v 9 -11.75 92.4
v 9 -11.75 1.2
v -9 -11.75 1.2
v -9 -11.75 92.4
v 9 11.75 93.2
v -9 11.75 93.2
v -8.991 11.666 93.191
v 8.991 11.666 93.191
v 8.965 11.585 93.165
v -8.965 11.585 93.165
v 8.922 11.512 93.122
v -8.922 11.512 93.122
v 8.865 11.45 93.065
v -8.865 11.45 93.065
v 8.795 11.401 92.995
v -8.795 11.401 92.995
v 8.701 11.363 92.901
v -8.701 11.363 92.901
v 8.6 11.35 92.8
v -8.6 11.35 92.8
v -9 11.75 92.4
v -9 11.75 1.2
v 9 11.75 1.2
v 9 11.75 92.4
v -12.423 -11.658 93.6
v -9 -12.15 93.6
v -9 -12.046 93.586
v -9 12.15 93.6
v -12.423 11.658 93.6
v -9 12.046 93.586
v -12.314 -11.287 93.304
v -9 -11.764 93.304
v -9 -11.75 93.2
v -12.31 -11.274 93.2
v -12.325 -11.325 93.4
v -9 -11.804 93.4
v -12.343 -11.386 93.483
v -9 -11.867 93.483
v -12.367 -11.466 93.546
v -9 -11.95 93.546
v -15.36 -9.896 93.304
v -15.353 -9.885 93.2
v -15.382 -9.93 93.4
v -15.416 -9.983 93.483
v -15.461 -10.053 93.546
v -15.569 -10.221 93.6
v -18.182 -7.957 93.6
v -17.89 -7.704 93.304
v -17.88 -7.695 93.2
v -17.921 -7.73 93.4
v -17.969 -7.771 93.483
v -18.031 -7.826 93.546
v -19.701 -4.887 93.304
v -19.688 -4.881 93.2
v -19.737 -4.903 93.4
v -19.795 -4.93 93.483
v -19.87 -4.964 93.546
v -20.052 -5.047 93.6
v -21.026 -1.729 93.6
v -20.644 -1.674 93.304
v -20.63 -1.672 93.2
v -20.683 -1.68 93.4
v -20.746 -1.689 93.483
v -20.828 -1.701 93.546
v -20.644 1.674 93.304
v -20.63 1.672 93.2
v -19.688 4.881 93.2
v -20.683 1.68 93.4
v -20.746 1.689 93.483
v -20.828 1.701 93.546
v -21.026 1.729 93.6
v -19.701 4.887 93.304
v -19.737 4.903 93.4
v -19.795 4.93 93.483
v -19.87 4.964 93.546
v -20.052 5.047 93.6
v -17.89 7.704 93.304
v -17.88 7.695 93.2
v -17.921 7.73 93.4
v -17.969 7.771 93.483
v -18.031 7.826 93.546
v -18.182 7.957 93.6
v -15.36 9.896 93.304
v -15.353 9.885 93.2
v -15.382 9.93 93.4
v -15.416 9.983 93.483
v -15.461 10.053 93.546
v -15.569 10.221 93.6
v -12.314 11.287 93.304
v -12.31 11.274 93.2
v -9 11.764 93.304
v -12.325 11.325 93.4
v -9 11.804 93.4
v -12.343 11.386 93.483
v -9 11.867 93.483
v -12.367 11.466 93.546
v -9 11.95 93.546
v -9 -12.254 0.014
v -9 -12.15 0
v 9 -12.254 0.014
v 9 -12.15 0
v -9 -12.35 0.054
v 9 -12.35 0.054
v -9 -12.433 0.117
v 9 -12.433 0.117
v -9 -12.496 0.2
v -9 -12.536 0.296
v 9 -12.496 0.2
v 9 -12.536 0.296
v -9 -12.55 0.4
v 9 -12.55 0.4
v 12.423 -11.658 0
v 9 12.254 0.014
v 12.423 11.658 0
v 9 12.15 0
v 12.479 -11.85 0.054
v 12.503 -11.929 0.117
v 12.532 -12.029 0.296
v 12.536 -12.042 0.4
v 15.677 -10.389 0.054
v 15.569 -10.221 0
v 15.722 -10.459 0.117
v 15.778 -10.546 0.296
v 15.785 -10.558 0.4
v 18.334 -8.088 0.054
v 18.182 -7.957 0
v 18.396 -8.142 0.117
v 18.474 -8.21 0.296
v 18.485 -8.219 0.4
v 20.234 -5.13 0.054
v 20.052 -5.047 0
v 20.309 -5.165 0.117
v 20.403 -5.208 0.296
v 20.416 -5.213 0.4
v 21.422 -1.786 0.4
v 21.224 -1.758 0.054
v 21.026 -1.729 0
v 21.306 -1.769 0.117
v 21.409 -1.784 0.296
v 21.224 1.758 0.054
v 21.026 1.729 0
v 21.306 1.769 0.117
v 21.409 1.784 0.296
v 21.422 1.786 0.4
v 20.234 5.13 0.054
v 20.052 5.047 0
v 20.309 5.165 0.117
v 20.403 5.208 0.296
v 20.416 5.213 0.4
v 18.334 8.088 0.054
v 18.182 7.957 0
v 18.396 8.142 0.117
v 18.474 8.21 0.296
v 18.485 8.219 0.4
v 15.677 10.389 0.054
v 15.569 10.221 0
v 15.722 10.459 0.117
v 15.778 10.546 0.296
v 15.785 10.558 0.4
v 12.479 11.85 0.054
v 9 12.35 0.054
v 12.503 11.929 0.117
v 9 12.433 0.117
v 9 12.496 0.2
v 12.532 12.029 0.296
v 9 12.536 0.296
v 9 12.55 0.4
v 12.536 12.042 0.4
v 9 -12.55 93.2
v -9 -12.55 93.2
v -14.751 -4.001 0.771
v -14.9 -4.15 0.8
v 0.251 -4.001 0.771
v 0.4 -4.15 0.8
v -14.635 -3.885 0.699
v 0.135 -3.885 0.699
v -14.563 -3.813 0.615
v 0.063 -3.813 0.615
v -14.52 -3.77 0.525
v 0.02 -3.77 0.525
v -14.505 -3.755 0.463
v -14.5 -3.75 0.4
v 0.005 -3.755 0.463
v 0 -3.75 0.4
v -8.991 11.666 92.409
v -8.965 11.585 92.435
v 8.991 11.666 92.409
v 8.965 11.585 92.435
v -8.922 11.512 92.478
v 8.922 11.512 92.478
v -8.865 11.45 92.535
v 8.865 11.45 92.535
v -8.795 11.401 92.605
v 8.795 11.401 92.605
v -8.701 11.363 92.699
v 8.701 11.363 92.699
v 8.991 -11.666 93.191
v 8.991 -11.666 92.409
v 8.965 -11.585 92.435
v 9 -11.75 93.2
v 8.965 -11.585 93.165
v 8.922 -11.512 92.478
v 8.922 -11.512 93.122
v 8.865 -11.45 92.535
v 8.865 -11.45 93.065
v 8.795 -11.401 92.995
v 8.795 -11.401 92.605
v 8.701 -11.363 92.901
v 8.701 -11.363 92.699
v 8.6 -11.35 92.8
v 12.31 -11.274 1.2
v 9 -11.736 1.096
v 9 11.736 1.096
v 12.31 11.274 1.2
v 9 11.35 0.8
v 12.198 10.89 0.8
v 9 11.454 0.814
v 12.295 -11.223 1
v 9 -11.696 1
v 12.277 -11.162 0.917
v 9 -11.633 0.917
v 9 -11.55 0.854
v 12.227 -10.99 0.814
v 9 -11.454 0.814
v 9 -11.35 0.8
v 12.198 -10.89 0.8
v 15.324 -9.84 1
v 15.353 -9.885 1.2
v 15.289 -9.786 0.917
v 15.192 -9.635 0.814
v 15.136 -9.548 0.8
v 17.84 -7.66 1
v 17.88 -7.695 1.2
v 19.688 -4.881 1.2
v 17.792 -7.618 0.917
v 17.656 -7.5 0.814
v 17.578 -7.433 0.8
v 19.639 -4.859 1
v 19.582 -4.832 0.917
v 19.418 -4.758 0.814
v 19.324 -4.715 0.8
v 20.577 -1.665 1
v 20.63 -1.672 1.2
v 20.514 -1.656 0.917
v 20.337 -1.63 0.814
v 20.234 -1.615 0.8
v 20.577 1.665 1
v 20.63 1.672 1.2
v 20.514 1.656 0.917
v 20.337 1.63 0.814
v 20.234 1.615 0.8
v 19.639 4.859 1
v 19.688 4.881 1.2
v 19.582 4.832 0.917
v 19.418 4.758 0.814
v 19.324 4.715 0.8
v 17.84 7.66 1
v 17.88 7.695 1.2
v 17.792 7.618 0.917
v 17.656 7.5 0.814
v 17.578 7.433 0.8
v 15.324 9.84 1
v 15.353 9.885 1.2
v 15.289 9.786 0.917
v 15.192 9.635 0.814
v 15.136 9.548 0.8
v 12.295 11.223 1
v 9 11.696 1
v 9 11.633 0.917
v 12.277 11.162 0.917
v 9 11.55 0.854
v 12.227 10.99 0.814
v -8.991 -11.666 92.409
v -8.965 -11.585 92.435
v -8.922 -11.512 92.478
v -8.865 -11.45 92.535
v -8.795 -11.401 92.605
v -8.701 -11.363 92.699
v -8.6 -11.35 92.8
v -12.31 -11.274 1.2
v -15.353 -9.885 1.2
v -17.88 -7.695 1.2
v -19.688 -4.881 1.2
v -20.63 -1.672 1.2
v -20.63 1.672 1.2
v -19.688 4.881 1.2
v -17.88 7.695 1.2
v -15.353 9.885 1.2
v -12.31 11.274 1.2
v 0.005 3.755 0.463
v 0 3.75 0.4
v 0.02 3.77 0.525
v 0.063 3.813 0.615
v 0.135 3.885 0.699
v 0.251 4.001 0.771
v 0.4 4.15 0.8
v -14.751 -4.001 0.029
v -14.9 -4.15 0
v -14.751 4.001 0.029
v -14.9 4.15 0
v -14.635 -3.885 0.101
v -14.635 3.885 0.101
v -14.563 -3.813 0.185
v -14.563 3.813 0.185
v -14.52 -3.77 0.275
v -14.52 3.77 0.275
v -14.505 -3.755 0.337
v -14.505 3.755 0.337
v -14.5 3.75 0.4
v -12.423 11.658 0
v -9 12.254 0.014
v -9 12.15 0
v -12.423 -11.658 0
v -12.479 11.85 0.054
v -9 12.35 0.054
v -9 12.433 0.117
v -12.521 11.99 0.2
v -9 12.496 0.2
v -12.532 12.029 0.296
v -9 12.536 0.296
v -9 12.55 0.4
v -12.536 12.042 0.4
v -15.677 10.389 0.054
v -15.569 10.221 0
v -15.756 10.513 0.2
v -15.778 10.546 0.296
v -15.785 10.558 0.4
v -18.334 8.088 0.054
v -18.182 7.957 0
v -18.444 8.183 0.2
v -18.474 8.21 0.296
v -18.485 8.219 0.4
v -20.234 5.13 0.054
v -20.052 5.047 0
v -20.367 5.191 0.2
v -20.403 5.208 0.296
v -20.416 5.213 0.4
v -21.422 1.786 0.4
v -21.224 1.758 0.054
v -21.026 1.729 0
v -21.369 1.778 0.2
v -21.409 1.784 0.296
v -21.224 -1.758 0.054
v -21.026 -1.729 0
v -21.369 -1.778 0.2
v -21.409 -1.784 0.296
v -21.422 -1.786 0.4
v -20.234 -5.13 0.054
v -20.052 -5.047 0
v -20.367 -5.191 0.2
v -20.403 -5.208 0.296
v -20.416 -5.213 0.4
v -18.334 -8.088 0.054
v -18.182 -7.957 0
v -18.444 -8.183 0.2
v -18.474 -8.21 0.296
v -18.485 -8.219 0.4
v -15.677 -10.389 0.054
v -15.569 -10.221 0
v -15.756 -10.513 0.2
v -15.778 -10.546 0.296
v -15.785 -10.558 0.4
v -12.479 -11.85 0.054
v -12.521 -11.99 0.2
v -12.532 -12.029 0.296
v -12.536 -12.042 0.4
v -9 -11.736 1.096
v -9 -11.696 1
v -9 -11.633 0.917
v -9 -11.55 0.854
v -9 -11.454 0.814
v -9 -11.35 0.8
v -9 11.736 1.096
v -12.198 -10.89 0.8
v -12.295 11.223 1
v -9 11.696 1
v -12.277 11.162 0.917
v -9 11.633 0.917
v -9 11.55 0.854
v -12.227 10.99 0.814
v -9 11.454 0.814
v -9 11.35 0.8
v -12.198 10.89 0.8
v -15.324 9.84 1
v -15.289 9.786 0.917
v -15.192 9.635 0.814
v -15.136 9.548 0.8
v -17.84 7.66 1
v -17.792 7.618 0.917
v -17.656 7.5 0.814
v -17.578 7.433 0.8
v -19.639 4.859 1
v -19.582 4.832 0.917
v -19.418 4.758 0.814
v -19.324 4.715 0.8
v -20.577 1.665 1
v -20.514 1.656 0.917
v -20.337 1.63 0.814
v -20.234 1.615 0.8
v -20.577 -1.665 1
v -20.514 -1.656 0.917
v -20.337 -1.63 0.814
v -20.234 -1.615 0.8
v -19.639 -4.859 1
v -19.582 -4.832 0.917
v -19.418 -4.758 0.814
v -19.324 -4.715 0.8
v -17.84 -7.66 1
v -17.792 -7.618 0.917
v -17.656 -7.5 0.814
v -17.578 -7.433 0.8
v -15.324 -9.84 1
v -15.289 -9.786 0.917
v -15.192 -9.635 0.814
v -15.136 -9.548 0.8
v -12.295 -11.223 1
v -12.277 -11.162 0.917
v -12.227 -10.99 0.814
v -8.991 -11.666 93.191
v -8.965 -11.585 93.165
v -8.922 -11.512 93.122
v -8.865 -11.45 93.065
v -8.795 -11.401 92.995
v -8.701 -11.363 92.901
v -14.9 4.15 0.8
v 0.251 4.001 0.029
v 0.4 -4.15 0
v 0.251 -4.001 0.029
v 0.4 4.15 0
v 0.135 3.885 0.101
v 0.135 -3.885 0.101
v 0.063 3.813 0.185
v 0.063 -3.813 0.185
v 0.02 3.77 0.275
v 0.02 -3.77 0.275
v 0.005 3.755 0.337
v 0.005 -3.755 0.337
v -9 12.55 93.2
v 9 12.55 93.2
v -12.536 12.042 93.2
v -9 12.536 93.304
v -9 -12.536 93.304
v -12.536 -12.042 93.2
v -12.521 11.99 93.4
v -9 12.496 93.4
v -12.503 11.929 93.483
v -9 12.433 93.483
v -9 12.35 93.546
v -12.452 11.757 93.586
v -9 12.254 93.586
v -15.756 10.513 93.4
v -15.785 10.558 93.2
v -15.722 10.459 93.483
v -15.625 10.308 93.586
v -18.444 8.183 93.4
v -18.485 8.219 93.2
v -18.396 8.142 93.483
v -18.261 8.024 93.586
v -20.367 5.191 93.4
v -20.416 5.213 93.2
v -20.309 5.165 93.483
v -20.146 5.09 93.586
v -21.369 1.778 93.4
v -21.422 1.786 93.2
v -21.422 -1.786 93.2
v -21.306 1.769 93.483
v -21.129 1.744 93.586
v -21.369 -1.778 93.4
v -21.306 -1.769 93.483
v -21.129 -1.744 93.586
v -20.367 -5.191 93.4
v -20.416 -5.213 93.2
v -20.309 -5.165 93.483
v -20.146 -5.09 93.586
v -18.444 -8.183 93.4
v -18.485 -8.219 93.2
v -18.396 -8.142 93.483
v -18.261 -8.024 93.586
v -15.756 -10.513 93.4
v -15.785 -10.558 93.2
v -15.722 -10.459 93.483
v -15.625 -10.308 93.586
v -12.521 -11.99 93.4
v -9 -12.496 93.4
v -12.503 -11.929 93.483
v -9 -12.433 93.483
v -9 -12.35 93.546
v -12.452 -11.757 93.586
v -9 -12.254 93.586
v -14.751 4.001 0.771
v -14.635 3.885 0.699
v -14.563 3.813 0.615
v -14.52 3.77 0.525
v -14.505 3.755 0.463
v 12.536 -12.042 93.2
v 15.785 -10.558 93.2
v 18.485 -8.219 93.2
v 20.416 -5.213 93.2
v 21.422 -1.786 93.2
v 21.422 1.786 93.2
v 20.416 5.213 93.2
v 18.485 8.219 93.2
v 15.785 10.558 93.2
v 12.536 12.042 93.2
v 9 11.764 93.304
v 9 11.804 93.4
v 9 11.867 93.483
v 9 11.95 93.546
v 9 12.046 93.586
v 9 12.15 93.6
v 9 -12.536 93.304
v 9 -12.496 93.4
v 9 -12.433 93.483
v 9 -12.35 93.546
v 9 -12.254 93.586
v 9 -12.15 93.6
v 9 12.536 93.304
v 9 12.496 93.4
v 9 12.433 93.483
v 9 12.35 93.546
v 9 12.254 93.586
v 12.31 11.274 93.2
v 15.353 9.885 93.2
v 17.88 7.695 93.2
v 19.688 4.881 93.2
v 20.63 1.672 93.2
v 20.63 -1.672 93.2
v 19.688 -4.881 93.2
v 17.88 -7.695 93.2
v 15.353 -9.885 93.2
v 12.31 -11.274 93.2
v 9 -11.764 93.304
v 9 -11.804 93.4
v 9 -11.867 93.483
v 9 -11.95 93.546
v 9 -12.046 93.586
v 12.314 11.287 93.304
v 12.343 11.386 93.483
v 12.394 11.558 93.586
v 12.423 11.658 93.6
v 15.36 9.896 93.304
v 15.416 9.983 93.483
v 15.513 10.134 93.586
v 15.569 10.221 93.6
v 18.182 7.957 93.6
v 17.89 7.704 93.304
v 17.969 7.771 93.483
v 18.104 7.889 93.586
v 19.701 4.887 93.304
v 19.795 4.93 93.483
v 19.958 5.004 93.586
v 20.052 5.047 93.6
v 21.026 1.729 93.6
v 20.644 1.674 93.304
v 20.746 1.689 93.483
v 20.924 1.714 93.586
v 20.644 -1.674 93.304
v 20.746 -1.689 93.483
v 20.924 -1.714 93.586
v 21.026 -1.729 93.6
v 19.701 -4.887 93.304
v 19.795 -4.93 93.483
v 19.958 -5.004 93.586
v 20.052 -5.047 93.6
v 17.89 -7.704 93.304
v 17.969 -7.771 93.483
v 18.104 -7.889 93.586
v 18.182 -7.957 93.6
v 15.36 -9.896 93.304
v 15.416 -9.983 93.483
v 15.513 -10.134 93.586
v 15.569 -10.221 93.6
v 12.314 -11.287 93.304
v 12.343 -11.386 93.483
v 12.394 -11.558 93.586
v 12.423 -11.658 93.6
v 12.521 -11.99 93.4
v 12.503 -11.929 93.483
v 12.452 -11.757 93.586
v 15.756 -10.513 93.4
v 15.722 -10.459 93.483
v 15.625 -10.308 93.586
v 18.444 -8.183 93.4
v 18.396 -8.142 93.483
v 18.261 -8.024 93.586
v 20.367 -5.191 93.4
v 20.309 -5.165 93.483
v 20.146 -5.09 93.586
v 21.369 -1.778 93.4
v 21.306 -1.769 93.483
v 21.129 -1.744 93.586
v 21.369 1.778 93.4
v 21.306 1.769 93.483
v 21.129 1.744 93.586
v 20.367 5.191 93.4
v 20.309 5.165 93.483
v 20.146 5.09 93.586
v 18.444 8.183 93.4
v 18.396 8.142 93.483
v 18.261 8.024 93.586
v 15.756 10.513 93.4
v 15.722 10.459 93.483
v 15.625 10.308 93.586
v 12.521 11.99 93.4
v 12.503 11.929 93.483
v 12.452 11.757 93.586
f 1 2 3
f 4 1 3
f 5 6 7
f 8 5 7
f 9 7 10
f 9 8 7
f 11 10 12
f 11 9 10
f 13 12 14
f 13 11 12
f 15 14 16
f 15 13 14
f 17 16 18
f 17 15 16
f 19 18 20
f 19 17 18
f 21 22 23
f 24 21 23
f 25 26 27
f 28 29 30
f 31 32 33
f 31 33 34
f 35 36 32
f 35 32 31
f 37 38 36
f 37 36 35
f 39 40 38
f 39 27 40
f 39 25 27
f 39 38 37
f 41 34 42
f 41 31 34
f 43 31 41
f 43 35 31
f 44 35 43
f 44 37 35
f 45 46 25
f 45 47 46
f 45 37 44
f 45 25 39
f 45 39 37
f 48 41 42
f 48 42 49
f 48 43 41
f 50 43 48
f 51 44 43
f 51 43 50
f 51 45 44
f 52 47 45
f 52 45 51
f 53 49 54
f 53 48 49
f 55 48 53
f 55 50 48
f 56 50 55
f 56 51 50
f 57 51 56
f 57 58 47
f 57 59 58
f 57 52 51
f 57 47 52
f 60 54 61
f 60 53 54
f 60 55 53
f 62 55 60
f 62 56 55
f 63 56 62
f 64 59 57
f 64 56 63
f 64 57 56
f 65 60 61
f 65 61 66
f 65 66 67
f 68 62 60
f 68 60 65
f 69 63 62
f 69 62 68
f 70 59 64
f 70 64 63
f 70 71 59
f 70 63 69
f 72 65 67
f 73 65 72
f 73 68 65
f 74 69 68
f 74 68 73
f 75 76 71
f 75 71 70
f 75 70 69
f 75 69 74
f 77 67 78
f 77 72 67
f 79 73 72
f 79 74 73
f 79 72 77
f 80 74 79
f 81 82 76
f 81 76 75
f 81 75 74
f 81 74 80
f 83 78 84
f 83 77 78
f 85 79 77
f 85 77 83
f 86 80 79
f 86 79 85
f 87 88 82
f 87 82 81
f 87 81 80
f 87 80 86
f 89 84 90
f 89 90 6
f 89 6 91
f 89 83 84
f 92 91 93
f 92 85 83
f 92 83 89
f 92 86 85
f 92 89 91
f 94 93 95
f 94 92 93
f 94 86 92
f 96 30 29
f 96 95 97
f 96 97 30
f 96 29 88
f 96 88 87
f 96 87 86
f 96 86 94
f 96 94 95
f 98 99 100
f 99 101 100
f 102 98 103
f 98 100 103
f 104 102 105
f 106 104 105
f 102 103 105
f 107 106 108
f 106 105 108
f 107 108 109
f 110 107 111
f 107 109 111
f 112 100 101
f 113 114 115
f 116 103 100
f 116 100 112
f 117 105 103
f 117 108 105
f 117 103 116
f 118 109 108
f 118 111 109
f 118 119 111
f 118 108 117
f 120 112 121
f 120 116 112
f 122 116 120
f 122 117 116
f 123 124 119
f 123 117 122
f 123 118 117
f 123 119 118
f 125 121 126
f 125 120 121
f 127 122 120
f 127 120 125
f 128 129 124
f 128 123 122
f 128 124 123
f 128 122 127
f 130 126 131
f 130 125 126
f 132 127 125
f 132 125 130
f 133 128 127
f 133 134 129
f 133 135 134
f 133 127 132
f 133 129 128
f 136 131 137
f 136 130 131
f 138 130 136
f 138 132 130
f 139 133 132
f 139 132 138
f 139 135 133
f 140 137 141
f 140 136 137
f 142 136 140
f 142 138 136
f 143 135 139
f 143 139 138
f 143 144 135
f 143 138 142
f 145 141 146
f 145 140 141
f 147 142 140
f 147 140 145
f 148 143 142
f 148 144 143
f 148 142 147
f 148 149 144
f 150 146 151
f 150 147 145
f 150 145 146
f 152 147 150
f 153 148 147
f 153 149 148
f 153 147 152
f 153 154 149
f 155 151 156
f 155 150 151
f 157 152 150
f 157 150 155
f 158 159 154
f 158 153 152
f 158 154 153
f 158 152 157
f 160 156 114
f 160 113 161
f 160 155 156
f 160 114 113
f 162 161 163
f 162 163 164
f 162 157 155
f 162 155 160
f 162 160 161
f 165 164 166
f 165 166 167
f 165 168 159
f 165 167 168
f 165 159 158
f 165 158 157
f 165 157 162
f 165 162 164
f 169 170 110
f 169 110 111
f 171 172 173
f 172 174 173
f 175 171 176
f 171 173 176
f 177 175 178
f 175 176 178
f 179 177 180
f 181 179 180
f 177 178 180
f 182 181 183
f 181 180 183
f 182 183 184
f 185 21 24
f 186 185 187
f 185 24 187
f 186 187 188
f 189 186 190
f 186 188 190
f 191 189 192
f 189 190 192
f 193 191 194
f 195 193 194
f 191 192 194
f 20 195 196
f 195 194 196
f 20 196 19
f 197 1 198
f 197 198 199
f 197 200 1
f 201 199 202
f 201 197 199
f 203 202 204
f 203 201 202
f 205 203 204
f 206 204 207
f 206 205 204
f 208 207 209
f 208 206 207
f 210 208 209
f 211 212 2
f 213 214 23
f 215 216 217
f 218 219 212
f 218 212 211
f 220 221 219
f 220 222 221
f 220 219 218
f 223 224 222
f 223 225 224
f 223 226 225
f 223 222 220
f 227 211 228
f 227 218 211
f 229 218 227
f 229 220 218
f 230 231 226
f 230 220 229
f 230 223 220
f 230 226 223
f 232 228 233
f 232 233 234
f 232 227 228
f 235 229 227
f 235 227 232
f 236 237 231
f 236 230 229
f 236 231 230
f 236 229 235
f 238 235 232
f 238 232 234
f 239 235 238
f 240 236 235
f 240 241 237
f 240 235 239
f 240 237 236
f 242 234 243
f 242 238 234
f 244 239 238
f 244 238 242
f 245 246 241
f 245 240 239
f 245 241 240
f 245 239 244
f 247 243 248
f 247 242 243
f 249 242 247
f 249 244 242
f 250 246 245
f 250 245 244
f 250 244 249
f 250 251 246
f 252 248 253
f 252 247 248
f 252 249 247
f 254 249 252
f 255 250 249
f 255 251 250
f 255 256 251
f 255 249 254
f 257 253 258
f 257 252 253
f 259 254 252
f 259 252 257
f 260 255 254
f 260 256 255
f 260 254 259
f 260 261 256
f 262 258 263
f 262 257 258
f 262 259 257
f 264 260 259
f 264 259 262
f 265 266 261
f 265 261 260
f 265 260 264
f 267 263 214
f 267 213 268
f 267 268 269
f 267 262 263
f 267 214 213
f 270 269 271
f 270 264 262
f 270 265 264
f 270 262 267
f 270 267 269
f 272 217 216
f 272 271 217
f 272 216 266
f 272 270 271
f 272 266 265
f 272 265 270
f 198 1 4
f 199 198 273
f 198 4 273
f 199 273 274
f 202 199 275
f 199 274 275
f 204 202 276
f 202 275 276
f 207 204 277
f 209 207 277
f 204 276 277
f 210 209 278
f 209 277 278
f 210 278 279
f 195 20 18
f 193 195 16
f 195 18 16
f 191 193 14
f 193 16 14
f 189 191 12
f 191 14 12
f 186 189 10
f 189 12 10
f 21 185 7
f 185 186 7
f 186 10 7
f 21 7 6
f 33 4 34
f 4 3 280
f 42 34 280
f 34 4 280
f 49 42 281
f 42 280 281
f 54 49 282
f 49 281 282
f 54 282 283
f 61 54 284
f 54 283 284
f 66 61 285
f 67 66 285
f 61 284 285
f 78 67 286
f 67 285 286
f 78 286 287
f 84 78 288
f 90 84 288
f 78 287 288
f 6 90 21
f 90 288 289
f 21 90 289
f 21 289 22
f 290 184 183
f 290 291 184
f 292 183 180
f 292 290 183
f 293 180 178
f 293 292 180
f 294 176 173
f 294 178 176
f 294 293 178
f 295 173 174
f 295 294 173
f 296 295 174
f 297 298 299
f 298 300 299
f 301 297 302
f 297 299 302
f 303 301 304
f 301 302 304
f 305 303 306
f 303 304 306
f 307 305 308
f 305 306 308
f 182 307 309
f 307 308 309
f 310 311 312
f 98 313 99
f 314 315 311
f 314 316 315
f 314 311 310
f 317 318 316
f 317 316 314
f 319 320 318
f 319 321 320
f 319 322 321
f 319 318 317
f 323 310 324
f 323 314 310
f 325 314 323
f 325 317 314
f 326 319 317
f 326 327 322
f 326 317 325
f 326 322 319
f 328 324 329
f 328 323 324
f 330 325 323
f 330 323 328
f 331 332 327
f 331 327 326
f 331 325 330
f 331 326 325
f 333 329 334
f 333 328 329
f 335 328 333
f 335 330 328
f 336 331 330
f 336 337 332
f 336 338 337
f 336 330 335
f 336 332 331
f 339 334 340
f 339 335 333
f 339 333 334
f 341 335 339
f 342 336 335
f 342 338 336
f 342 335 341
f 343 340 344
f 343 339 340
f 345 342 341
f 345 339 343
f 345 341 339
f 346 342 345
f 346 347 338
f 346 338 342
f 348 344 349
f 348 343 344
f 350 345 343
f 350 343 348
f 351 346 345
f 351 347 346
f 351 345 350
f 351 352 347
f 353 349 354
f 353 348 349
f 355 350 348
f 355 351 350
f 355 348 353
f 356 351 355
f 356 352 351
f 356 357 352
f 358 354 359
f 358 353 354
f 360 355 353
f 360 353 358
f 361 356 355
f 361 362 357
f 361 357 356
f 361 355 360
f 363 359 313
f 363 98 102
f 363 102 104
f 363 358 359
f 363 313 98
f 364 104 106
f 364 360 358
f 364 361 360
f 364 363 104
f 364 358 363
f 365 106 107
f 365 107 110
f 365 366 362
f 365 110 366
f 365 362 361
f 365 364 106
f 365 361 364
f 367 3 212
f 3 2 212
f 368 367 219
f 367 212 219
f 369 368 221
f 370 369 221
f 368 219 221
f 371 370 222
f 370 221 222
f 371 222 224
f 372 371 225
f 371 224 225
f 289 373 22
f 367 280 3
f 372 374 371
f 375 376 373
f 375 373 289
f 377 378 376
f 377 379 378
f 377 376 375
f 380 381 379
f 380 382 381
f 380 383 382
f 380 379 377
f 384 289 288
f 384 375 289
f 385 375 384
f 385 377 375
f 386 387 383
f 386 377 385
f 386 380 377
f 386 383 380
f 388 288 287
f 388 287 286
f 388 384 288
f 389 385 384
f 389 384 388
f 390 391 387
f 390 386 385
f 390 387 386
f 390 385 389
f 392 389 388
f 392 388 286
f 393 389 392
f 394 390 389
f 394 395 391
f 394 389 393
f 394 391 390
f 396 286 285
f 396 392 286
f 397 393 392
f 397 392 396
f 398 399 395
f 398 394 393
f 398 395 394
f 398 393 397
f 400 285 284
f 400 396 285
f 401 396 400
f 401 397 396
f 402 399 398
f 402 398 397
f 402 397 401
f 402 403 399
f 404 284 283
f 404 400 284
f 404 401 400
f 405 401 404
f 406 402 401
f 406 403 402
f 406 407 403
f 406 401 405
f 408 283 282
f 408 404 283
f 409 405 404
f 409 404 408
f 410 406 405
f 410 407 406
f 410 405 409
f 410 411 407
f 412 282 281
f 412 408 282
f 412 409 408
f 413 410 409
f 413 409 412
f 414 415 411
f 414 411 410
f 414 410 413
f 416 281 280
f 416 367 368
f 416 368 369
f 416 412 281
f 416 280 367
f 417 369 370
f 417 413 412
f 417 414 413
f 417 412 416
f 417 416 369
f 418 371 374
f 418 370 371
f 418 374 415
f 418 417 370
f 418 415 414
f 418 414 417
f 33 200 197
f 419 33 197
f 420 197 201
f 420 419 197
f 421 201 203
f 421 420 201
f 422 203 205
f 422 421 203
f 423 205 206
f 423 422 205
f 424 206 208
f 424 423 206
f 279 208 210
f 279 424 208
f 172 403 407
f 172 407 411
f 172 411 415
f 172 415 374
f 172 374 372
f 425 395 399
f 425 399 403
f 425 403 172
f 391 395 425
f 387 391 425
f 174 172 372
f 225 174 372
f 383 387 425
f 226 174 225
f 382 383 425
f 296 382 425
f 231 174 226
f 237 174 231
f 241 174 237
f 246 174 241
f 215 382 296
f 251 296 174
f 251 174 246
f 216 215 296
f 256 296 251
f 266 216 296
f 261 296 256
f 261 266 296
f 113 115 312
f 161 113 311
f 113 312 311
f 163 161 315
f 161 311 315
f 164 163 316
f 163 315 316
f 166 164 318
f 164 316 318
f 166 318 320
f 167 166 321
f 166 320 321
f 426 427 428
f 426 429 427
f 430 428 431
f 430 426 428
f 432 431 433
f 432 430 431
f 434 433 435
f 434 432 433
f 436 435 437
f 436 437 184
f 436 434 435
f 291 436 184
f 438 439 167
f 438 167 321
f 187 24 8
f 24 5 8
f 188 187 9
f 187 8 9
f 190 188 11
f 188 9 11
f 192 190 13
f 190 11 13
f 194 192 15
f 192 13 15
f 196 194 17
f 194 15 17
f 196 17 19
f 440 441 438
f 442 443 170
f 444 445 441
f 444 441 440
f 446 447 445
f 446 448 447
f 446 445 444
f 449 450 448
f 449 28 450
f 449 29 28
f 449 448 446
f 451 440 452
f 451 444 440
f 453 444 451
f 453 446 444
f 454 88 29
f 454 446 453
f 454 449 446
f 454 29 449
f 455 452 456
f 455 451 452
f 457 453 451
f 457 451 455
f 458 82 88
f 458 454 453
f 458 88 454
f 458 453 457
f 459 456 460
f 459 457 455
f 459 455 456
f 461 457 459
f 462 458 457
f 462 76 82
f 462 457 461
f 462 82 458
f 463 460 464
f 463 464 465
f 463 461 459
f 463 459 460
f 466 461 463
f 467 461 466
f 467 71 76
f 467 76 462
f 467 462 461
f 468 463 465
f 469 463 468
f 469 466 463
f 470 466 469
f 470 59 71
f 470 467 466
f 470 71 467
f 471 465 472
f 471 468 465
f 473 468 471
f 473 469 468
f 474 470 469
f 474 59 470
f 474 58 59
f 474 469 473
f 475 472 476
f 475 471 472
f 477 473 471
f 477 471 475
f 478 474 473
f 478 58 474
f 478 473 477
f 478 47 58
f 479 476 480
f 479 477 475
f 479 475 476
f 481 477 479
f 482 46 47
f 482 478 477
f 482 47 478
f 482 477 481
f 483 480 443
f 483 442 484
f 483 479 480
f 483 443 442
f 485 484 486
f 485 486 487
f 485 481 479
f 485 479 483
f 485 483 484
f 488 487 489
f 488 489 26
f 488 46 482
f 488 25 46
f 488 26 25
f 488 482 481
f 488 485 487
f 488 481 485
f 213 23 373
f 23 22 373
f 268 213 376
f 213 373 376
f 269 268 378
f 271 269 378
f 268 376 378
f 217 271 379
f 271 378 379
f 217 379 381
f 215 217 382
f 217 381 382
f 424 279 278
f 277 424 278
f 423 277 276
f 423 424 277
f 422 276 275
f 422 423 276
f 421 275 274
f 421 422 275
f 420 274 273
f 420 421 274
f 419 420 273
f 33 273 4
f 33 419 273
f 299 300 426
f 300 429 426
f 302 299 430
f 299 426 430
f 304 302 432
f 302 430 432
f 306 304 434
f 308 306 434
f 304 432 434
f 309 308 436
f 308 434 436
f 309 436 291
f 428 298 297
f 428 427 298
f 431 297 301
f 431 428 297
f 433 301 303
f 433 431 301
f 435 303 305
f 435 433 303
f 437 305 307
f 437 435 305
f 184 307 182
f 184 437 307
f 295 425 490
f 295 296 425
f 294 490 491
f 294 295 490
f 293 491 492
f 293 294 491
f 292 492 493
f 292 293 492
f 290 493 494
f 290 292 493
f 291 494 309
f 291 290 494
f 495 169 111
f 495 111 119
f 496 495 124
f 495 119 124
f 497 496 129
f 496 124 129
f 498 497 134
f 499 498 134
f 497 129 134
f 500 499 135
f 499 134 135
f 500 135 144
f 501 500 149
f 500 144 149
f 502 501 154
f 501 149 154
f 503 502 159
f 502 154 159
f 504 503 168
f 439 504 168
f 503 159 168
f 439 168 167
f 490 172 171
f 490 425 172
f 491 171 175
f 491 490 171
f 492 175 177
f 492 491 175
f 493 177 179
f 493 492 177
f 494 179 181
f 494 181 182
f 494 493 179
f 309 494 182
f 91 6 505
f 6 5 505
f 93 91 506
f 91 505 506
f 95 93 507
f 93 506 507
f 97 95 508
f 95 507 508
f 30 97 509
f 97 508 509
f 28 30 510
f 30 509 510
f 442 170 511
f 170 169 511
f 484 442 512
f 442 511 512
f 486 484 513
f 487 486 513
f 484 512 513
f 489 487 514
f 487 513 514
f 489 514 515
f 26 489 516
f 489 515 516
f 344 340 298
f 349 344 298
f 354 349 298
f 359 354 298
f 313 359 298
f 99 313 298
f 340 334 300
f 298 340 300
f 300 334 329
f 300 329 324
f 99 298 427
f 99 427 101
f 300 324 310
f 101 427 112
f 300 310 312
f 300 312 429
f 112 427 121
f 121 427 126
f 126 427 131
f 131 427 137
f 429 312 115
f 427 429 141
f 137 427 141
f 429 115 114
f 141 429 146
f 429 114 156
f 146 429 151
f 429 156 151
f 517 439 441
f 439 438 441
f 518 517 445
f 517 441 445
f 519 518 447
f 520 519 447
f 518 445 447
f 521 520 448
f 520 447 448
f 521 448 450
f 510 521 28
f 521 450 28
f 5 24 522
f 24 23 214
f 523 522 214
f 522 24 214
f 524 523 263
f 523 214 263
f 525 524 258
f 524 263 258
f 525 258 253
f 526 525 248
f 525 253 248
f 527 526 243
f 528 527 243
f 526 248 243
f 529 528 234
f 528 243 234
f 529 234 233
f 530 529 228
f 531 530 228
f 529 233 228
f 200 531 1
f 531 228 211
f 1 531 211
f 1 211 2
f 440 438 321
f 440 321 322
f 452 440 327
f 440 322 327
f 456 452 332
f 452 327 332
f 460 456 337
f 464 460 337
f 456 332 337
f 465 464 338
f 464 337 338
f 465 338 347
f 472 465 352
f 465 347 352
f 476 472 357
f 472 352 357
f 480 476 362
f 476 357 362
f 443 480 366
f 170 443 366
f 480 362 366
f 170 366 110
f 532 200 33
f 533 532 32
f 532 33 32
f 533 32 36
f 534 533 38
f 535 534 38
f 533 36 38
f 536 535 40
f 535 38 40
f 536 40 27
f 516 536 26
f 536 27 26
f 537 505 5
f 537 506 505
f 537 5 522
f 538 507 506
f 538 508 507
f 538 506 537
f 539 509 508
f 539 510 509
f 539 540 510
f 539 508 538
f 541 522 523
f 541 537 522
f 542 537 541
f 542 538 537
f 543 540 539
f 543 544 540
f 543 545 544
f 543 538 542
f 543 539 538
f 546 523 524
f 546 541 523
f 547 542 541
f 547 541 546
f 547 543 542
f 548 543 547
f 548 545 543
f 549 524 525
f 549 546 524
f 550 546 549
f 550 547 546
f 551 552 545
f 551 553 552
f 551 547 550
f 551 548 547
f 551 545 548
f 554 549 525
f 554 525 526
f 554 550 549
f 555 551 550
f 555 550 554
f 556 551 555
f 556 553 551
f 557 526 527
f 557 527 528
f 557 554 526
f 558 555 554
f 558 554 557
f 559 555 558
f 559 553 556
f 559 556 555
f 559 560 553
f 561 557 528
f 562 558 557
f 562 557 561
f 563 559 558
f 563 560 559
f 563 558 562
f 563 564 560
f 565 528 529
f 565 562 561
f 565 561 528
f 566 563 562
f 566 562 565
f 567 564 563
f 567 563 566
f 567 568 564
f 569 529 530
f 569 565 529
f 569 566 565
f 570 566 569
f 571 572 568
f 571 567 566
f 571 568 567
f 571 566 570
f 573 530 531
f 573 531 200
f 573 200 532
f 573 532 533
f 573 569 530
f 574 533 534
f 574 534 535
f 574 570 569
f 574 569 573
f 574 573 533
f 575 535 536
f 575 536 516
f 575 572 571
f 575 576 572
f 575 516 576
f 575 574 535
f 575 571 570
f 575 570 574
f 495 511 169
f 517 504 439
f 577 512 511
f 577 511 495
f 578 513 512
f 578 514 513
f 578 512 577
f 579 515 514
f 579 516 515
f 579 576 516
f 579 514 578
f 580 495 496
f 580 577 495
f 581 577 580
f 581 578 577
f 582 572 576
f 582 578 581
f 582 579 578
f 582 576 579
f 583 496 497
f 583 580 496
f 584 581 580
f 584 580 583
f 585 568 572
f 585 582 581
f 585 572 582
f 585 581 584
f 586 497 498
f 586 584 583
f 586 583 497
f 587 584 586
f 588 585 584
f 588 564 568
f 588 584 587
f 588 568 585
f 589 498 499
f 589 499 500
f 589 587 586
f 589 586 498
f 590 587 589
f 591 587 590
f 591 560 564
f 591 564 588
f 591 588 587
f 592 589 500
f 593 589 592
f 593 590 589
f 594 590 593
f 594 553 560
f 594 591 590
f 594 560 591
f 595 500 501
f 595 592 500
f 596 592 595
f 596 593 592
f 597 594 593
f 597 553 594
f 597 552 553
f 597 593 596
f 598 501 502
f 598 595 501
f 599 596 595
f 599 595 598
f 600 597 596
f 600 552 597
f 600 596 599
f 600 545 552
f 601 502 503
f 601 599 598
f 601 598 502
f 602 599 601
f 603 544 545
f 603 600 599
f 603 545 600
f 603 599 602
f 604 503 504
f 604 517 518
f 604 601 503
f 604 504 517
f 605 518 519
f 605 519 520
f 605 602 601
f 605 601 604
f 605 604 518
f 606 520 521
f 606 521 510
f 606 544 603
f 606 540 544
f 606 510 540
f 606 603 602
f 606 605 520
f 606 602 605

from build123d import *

# Parameters (mm, degrees)
F0_W     = 14.5
F0_H     = 7.5
F1_DEPTH = 0.8
F2_DEPTH = 93.6
F3_R     = 0.39999
F4_R     = 0.4
F5_W     = 18
F5_H     = 0.8
F6_W     = 18
F6_H     = 0.8
F7_DEPTH = 0.4
F8_R     = 0.39999


# Not quite as in the source:
# - a fillet or chamfer is up to 0.001 mm smaller than in the source, because OpenCascade refuses the exact size
# - a feature names something its author has since deleted; it is built from what else it names


with BuildPart() as f1:
    # F0 (on Top) → F1 (new body)
    with BuildSketch(Plane.XY):
        with BuildLine():
            Line((9, 12.55), (-9, 12.55))
            ThreePointArc((-9, 12.55), (-21.55, 0), (-9, -12.55))
            Line((-9, -12.55), (9, -12.55))
            ThreePointArc((9, -12.55), (21.55, 0), (9, 12.55))
        make_face()
        with BuildLine():
            ThreePointArc((-9, -11.75), (-20.75, 0), (-9, 11.75))
            Line((-9, 11.75), (9, 11.75))
            ThreePointArc((9, 11.75), (20.75, 0), (9, -11.75))
            Line((9, -11.75), (-9, -11.75))
        make_face(mode=Mode.SUBTRACT)
        with BuildLine():
            Line((9, 11.75), (-9, 11.75))
            ThreePointArc((-9, 11.75), (-20.75, 0), (-9, -11.75))
            Line((-9, -11.75), (9, -11.75))
            ThreePointArc((9, -11.75), (20.75, 0), (9, 11.75))
        make_face()
        with Locations((-7.25, 0)):
            Rectangle(F0_W, F0_H, mode=Mode.SUBTRACT)
    extrude(amount=F1_DEPTH)

    # F0 (on Top) → F2 (join)
    with BuildSketch(Plane.XY):
        with BuildLine():
            Line((9, 12.55), (-9, 12.55))
            ThreePointArc((-9, 12.55), (-21.55, 0), (-9, -12.55))
            Line((-9, -12.55), (9, -12.55))
            ThreePointArc((9, -12.55), (21.55, 0), (9, 12.55))
        make_face()
        with BuildLine():
            ThreePointArc((-9, -11.75), (-20.75, 0), (-9, 11.75))
            Line((-9, 11.75), (9, 11.75))
            ThreePointArc((9, 11.75), (20.75, 0), (9, -11.75))
            Line((9, -11.75), (-9, -11.75))
        make_face(mode=Mode.SUBTRACT)
    extrude(amount=F2_DEPTH)

    # F3 (radius 0.4 in the source; OpenCascade refuses exactly that, so slightly less here)
    f3_edges = [f1.edges().sort_by_distance(p)[0] for p in [
        (0, -12.55, 93.6),
        (0, -11.75, 93.6),
        (0, -12.55, 0),
        (-7.25, 3.75, 0),
        (-7.25, 3.75, 0.8),
        (-14.5, 0, 0),
        (-14.5, 0, 0.8),
        (-7.25, -3.75, 0),
        (-7.25, -3.75, 0.8),
        (0, 0, 0),
        (0, 0, 0.8),
    ]]
    fillet(f3_edges, radius=F3_R)

    # F4
    f4_edges = [f1.edges().sort_by_distance(p)[0] for p in [
        (0, 11.75, 0.8),
    ]]
    fillet(f4_edges, radius=F4_R)

    # F5 (on face) + F6 (on face) → F7 (join, symmetric)
    with BuildSketch(Plane.XZ.offset(-11.75)):
        with Locations((0, 92.8)):
            Rectangle(F5_W, F5_H)
    with BuildSketch(Plane(origin=(0, -11.75, 0), x_dir=(-1, 0, 0), z_dir=(0, 1, 0))):
        with Locations((0, 92.8)):
            Rectangle(F6_W, F6_H)
    extrude(amount=F7_DEPTH, both=True, dir=(0, -1, 0))

    # F8 (radius 0.4 in the source; OpenCascade refuses exactly that, so slightly less here)
    f8_edges = [f1.edges().sort_by_distance(p)[0] for p in [
        (0, 11.35, 93.2),
        (0, 11.35, 92.4),
        (-9, 11.35, 92.8),
        (9, 11.35, 92.8),
        (0, -11.35, 93.2),
        (0, -11.35, 92.4),
        (9, -11.35, 92.8),
        (-9, -11.35, 92.8),
    ]]
    fillet(f8_edges, radius=F8_R)


solid = f1.part
